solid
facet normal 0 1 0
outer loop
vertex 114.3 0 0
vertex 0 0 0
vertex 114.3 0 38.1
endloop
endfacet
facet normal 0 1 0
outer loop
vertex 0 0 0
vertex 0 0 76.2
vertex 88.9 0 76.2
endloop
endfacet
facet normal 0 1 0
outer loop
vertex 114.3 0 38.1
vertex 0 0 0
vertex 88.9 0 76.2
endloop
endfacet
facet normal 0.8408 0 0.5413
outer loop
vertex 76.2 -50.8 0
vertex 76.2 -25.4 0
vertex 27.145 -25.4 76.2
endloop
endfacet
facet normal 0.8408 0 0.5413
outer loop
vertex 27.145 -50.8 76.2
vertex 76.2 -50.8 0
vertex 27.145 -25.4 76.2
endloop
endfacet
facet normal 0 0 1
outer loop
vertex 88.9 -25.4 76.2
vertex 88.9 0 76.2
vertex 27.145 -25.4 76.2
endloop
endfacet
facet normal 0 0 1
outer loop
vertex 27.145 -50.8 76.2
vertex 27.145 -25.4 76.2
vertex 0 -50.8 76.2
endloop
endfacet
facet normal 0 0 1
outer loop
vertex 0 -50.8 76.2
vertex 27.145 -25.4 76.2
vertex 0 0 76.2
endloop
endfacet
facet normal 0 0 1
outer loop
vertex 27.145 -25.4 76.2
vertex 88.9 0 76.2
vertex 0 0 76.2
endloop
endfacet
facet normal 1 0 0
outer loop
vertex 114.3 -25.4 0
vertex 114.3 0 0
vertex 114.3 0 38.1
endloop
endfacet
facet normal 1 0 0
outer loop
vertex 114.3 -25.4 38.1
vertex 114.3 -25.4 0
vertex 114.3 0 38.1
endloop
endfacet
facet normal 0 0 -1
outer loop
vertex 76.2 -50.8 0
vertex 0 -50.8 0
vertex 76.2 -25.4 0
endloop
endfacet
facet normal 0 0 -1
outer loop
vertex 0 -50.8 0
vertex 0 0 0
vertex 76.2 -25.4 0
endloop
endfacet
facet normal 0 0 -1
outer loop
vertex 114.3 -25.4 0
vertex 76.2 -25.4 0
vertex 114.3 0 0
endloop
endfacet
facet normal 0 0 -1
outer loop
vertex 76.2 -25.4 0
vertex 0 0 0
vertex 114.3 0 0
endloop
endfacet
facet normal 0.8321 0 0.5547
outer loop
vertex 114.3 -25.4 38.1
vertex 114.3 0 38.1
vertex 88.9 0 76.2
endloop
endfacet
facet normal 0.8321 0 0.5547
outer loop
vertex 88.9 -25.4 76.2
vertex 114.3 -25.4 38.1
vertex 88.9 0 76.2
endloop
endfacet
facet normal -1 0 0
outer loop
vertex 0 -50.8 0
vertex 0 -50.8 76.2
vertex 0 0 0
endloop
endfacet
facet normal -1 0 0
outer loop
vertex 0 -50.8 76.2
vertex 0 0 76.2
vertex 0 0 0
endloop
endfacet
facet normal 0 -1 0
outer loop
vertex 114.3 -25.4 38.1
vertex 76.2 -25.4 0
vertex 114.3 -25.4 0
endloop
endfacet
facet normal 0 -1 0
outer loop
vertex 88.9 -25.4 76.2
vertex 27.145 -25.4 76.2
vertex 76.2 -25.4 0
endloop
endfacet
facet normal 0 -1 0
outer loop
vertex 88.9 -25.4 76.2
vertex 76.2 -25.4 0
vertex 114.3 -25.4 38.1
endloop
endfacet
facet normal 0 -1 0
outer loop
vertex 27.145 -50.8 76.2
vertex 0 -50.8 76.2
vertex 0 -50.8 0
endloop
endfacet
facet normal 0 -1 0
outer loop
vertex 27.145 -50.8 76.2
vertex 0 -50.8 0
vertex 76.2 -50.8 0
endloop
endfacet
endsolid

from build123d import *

# Parameters (mm, degrees)
F1_DEPTH = 25.4
F3_DEPTH = 25.4


with BuildPart() as f1:
    # F0 (on Front) → F1 (new body)
    with BuildSketch(Plane.XZ):
        Polygon((0, 76.2), (0, 0), (114.3, 0), (114.3, 38.1), (88.9, 76.2), align=None)
    extrude(amount=F1_DEPTH)

    # F2 (on face) → F3 (join)
    with BuildSketch(Plane.XZ.offset(25.4)):
        Polygon((27.145131, 76.2), (1.745131, 76.2), (0, 76.2), (0, 0), (76.2, 0), align=None)
    extrude(amount=F3_DEPTH)


solid = f1.part
